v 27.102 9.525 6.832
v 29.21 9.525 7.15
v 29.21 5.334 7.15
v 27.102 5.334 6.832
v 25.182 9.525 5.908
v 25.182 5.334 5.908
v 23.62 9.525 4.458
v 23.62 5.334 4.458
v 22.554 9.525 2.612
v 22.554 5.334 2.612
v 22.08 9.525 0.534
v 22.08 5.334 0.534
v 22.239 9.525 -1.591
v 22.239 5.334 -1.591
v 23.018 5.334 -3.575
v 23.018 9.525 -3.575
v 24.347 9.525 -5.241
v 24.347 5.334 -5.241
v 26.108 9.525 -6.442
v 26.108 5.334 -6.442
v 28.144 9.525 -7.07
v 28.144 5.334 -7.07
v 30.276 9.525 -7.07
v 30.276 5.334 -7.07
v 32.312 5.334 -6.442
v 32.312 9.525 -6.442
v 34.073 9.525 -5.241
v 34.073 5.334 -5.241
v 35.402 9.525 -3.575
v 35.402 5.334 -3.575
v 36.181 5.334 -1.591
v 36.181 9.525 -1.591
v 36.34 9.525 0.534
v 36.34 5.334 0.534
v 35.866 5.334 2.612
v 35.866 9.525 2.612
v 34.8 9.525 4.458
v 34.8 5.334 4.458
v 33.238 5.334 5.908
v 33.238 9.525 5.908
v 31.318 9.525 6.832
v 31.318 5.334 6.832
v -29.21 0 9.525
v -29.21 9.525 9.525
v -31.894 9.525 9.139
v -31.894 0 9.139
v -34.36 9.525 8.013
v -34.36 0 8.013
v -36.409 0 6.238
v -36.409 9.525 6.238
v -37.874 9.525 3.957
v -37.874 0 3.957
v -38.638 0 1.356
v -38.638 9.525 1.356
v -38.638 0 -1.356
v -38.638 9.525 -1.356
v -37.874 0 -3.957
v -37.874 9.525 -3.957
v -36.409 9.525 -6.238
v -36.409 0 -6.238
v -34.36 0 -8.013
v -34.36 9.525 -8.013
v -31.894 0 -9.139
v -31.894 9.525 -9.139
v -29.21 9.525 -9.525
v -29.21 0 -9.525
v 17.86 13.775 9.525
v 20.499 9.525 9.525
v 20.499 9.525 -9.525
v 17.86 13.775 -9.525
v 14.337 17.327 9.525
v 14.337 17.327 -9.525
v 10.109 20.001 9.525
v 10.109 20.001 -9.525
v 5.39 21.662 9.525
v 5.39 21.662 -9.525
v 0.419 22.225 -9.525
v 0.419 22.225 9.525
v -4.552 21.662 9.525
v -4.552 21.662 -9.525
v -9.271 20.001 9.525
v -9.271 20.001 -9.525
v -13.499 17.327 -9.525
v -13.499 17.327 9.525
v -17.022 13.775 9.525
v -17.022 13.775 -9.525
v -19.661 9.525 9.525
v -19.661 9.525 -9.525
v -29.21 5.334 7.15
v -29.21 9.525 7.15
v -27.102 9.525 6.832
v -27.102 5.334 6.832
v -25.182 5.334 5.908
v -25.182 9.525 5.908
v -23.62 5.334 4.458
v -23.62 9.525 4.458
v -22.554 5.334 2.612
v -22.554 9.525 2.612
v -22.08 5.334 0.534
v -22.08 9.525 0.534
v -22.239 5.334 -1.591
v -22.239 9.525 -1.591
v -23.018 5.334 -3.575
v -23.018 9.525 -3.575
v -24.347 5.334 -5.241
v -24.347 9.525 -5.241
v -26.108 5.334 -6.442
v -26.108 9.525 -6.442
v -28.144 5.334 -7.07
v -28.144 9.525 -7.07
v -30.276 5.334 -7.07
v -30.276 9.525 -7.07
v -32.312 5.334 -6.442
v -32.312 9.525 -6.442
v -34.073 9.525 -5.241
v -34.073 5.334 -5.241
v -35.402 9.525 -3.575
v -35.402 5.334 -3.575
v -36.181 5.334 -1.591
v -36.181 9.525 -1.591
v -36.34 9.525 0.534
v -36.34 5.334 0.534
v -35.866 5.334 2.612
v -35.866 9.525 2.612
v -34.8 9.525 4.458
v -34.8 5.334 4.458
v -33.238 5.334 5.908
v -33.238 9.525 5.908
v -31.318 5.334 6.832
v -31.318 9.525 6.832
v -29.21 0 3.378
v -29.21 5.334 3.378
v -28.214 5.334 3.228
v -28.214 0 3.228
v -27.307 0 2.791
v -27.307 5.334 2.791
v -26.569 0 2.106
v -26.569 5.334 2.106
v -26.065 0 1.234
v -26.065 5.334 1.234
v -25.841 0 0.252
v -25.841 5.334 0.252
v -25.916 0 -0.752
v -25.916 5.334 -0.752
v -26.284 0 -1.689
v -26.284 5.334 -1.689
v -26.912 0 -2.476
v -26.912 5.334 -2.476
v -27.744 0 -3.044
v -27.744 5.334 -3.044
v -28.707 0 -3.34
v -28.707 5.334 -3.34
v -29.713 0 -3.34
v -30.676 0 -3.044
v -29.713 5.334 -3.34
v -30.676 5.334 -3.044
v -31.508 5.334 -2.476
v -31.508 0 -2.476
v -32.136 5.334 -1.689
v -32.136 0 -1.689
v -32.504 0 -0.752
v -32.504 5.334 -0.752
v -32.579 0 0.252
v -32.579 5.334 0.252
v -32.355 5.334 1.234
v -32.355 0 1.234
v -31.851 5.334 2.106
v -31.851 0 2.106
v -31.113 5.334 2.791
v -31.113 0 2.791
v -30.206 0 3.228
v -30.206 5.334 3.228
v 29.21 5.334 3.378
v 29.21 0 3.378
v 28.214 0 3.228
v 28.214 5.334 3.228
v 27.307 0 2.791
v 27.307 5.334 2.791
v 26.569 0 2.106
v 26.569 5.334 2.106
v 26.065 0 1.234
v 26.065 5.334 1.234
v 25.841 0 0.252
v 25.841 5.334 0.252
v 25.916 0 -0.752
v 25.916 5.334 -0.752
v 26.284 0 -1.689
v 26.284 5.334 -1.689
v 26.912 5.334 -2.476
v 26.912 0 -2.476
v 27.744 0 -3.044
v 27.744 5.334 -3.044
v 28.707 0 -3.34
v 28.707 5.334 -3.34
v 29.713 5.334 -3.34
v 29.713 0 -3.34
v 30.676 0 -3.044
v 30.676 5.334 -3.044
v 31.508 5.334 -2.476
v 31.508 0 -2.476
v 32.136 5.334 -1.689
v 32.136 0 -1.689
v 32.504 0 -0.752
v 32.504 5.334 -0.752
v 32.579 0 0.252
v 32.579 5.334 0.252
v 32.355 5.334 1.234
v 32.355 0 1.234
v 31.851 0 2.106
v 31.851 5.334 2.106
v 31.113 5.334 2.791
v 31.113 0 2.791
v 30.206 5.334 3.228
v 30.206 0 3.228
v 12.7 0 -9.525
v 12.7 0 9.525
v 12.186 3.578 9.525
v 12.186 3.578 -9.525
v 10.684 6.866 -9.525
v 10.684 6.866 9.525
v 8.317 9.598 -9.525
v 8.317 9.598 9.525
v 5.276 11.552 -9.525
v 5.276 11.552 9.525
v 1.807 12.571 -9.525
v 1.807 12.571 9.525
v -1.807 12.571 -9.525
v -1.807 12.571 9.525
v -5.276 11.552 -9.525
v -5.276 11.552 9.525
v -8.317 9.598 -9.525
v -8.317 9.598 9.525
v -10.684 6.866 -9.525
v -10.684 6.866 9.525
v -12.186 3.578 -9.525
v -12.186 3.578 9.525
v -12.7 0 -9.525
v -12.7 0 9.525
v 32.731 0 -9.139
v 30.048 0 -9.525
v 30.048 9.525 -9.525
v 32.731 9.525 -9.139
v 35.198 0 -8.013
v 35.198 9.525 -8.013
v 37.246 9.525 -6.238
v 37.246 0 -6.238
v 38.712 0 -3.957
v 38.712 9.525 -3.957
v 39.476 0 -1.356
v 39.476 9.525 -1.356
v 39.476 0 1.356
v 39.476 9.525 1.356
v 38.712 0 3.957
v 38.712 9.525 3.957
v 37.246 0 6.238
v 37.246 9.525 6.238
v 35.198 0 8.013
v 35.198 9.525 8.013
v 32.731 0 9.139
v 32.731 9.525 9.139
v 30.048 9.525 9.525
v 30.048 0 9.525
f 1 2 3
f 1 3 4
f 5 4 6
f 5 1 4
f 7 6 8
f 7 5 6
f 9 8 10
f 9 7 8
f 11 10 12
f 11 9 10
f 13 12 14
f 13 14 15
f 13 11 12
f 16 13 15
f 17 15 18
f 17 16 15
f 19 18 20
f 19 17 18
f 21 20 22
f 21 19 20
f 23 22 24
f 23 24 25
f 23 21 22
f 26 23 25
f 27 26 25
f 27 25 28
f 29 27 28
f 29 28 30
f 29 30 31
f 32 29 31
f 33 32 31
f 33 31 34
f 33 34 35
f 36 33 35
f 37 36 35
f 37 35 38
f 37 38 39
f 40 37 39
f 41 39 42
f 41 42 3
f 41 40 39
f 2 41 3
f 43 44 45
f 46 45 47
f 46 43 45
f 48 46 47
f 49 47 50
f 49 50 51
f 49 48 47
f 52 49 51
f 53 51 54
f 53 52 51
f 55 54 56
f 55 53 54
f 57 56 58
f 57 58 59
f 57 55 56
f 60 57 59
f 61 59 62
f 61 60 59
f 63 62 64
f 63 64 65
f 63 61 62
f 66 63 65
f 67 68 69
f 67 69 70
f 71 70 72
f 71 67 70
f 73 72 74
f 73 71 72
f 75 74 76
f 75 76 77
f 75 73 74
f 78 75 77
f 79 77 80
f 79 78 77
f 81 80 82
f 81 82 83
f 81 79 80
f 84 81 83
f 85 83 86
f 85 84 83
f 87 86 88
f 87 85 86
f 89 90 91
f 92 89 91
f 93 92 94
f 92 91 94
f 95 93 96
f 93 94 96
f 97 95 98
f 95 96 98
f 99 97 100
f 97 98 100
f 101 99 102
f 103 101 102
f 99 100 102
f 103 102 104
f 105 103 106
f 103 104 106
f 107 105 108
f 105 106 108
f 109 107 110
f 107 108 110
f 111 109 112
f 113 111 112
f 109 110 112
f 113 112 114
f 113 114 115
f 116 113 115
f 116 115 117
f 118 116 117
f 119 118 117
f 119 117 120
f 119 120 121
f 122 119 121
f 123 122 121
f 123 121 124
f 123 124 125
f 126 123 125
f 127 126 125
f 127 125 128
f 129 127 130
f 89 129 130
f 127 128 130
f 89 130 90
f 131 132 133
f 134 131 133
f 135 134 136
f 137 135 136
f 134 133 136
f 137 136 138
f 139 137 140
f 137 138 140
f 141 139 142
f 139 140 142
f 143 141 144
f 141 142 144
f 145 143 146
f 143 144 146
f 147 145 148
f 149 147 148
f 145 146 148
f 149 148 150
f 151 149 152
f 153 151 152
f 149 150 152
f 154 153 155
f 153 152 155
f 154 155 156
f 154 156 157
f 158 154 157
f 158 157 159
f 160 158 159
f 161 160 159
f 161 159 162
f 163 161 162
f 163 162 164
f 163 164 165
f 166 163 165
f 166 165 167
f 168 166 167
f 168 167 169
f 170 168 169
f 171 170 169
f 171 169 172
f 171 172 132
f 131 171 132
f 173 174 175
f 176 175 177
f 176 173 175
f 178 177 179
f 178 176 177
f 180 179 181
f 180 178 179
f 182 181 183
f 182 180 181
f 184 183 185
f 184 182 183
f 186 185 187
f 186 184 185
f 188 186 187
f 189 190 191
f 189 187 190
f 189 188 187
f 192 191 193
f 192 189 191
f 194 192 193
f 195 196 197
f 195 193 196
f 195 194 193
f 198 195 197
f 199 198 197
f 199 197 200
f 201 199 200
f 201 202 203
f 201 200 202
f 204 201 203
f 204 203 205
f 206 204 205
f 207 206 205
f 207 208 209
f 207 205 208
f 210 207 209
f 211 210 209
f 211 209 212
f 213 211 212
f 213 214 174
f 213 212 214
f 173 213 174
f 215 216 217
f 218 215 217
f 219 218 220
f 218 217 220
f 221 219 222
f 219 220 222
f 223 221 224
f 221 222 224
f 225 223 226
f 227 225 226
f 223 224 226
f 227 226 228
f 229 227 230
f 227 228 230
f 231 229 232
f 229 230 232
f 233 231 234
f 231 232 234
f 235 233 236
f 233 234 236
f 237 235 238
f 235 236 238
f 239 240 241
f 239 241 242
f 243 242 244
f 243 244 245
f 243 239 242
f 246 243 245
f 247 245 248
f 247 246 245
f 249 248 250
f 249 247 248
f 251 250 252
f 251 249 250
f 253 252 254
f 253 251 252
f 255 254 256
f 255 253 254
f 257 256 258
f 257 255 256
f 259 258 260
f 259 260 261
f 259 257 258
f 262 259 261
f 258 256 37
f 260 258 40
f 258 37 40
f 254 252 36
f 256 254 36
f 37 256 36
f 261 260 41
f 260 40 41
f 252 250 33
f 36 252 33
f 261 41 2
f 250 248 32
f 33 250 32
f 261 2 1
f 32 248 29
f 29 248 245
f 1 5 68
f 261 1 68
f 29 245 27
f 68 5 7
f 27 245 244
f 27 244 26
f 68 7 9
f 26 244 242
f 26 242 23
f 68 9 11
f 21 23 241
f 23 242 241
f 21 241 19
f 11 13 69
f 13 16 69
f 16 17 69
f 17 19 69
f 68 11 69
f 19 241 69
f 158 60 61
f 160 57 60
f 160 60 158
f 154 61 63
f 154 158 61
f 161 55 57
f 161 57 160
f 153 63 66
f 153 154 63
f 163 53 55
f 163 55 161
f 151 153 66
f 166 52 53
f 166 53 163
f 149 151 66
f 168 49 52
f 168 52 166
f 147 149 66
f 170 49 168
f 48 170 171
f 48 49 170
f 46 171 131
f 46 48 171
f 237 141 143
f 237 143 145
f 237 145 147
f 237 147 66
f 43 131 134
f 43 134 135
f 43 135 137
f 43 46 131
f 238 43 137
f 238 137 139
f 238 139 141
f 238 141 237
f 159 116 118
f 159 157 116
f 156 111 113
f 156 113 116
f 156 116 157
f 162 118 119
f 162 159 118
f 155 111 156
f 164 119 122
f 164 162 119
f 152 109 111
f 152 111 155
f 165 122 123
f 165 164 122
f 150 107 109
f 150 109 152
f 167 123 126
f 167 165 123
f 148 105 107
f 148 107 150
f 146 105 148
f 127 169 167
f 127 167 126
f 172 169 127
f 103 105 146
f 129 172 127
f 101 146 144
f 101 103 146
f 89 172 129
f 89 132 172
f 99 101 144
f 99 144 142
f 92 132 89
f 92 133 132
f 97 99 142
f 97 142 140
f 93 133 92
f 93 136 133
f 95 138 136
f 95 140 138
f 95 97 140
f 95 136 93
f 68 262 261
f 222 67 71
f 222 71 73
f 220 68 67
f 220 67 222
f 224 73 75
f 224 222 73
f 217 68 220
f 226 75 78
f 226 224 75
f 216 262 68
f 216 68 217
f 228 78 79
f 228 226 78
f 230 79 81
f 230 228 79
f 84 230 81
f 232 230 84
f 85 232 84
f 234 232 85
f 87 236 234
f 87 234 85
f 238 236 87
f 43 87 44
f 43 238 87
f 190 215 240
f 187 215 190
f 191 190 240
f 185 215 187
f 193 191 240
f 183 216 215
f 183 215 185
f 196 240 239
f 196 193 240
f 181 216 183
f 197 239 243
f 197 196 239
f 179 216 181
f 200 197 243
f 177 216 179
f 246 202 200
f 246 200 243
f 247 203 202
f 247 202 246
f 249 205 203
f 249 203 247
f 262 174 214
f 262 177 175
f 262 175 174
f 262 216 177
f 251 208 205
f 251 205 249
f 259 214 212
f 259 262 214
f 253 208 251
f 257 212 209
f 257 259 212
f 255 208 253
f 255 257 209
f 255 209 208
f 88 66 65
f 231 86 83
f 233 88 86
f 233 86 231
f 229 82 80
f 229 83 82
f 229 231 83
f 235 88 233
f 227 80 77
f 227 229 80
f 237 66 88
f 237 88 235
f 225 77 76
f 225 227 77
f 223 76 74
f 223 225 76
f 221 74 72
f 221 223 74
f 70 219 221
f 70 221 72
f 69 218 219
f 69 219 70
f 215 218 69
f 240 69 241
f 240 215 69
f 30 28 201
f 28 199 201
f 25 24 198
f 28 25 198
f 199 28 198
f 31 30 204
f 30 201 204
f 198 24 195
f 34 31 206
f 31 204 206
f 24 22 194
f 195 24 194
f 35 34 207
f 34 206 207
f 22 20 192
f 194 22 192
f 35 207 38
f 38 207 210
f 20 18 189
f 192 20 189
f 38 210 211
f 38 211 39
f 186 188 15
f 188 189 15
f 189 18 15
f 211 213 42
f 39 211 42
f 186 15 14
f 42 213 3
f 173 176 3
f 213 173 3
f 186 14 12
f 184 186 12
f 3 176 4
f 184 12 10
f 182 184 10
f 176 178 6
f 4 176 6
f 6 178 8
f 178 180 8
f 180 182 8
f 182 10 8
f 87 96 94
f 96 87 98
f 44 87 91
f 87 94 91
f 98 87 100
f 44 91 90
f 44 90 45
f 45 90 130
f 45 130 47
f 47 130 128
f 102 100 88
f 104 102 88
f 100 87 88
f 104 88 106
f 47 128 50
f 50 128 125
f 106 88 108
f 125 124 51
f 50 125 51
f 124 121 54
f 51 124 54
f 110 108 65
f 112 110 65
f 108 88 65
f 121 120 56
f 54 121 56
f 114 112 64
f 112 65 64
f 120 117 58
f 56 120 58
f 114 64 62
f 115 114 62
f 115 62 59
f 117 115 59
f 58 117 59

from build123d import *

# Parameters (mm, degrees)
BASE_EXTRUDE_DEPTH = 9.525
ARCH_EXTRUDE_DEPTH = 19.05
SKETCH3_R          = 12.7
ARCH_CUT_DEPTH     = 50.222663057
SKETCH4_R          = 7.1501
LARGE_CUT_DEPTH    = 4.191
SKETCH5_R          = 3.3782
SMALL_CUT_DEPTH    = 45.068684339


with BuildPart() as part:
    # Sketch1 → Base Extrude (new body)
    with BuildSketch(Plane(origin=(0, 0, 0), x_dir=(1, 0, 0), z_dir=(0, 1, 0))):
        with BuildLine():
            Line((-29.21, 9.525), (30.047938144, 9.525))
            ThreePointArc((30.047938144, 9.525), (39.572938144, 0), (30.047938144, -9.525))
            Line((30.047938144, -9.525), (-29.21, -9.525))
            ThreePointArc((-29.21, -9.525), (-38.735, 0), (-29.21, 9.525))
        make_face()
    extrude(amount=BASE_EXTRUDE_DEPTH)

    # Sketch2 → Arch Extrude (add)
    with BuildSketch(Plane.XY.offset(9.525)):
        with BuildLine():
            Line((-21.806030928, 0), (22.643969072, 0))
            ThreePointArc((22.643969072, 0), (22.101207406, 4.881717509), (20.499432214, 9.525))
            Line((20.499432214, 9.525), (-19.66149407, 9.525))
            ThreePointArc((-19.66149407, 9.525), (-21.263269262, 4.881717509), (-21.806030928, 0))
        make_face()
        with BuildLine():
            Line((-19.66149407, 9.525), (20.499432214, 9.525))
            ThreePointArc((20.499432214, 9.525), (0.418969072, 22.225), (-19.66149407, 9.525))
        make_face()
    extrude(amount=-ARCH_EXTRUDE_DEPTH)

    # Sketch3 → Arch Cut (cut, through all)
    with BuildSketch(Plane.XY.offset(9.525)):
        Circle(SKETCH3_R)
    extrude(amount=-ARCH_CUT_DEPTH, mode=Mode.SUBTRACT)

    # Sketch4 → Large Cut (cut)
    with BuildSketch(Plane(origin=(0, 9.525, 0), x_dir=(1, 0, 0), z_dir=(0, 1, 0))):
        with Locations(Location((-29.21, 0, 0), (0, 0, 270))):
            Circle(SKETCH4_R)
    large_cut = extrude(amount=-LARGE_CUT_DEPTH, mode=Mode.SUBTRACT)

    # Sketch5 → Small Cut (cut, through all)
    with BuildSketch(Plane(origin=(0, 5.334, 0), x_dir=(1, 0, 0), z_dir=(0, 1, 0))):
        with Locations(Location((-29.21, 0, 0), (0, 0, 270))):
            Circle(SKETCH5_R)
    small_cut = extrude(amount=-SMALL_CUT_DEPTH, mode=Mode.SUBTRACT)

    # Mirror 2: Large Cut, Small Cut across plane
    add(large_cut.mirror(Plane(origin=(0, 0, 0), x_dir=(0, 0, 1), z_dir=(1, 0, 0))), mode=Mode.SUBTRACT)
    add(small_cut.mirror(Plane(origin=(0, 0, 0), x_dir=(0, 0, 1), z_dir=(1, 0, 0))), mode=Mode.SUBTRACT)


solid = part.part
